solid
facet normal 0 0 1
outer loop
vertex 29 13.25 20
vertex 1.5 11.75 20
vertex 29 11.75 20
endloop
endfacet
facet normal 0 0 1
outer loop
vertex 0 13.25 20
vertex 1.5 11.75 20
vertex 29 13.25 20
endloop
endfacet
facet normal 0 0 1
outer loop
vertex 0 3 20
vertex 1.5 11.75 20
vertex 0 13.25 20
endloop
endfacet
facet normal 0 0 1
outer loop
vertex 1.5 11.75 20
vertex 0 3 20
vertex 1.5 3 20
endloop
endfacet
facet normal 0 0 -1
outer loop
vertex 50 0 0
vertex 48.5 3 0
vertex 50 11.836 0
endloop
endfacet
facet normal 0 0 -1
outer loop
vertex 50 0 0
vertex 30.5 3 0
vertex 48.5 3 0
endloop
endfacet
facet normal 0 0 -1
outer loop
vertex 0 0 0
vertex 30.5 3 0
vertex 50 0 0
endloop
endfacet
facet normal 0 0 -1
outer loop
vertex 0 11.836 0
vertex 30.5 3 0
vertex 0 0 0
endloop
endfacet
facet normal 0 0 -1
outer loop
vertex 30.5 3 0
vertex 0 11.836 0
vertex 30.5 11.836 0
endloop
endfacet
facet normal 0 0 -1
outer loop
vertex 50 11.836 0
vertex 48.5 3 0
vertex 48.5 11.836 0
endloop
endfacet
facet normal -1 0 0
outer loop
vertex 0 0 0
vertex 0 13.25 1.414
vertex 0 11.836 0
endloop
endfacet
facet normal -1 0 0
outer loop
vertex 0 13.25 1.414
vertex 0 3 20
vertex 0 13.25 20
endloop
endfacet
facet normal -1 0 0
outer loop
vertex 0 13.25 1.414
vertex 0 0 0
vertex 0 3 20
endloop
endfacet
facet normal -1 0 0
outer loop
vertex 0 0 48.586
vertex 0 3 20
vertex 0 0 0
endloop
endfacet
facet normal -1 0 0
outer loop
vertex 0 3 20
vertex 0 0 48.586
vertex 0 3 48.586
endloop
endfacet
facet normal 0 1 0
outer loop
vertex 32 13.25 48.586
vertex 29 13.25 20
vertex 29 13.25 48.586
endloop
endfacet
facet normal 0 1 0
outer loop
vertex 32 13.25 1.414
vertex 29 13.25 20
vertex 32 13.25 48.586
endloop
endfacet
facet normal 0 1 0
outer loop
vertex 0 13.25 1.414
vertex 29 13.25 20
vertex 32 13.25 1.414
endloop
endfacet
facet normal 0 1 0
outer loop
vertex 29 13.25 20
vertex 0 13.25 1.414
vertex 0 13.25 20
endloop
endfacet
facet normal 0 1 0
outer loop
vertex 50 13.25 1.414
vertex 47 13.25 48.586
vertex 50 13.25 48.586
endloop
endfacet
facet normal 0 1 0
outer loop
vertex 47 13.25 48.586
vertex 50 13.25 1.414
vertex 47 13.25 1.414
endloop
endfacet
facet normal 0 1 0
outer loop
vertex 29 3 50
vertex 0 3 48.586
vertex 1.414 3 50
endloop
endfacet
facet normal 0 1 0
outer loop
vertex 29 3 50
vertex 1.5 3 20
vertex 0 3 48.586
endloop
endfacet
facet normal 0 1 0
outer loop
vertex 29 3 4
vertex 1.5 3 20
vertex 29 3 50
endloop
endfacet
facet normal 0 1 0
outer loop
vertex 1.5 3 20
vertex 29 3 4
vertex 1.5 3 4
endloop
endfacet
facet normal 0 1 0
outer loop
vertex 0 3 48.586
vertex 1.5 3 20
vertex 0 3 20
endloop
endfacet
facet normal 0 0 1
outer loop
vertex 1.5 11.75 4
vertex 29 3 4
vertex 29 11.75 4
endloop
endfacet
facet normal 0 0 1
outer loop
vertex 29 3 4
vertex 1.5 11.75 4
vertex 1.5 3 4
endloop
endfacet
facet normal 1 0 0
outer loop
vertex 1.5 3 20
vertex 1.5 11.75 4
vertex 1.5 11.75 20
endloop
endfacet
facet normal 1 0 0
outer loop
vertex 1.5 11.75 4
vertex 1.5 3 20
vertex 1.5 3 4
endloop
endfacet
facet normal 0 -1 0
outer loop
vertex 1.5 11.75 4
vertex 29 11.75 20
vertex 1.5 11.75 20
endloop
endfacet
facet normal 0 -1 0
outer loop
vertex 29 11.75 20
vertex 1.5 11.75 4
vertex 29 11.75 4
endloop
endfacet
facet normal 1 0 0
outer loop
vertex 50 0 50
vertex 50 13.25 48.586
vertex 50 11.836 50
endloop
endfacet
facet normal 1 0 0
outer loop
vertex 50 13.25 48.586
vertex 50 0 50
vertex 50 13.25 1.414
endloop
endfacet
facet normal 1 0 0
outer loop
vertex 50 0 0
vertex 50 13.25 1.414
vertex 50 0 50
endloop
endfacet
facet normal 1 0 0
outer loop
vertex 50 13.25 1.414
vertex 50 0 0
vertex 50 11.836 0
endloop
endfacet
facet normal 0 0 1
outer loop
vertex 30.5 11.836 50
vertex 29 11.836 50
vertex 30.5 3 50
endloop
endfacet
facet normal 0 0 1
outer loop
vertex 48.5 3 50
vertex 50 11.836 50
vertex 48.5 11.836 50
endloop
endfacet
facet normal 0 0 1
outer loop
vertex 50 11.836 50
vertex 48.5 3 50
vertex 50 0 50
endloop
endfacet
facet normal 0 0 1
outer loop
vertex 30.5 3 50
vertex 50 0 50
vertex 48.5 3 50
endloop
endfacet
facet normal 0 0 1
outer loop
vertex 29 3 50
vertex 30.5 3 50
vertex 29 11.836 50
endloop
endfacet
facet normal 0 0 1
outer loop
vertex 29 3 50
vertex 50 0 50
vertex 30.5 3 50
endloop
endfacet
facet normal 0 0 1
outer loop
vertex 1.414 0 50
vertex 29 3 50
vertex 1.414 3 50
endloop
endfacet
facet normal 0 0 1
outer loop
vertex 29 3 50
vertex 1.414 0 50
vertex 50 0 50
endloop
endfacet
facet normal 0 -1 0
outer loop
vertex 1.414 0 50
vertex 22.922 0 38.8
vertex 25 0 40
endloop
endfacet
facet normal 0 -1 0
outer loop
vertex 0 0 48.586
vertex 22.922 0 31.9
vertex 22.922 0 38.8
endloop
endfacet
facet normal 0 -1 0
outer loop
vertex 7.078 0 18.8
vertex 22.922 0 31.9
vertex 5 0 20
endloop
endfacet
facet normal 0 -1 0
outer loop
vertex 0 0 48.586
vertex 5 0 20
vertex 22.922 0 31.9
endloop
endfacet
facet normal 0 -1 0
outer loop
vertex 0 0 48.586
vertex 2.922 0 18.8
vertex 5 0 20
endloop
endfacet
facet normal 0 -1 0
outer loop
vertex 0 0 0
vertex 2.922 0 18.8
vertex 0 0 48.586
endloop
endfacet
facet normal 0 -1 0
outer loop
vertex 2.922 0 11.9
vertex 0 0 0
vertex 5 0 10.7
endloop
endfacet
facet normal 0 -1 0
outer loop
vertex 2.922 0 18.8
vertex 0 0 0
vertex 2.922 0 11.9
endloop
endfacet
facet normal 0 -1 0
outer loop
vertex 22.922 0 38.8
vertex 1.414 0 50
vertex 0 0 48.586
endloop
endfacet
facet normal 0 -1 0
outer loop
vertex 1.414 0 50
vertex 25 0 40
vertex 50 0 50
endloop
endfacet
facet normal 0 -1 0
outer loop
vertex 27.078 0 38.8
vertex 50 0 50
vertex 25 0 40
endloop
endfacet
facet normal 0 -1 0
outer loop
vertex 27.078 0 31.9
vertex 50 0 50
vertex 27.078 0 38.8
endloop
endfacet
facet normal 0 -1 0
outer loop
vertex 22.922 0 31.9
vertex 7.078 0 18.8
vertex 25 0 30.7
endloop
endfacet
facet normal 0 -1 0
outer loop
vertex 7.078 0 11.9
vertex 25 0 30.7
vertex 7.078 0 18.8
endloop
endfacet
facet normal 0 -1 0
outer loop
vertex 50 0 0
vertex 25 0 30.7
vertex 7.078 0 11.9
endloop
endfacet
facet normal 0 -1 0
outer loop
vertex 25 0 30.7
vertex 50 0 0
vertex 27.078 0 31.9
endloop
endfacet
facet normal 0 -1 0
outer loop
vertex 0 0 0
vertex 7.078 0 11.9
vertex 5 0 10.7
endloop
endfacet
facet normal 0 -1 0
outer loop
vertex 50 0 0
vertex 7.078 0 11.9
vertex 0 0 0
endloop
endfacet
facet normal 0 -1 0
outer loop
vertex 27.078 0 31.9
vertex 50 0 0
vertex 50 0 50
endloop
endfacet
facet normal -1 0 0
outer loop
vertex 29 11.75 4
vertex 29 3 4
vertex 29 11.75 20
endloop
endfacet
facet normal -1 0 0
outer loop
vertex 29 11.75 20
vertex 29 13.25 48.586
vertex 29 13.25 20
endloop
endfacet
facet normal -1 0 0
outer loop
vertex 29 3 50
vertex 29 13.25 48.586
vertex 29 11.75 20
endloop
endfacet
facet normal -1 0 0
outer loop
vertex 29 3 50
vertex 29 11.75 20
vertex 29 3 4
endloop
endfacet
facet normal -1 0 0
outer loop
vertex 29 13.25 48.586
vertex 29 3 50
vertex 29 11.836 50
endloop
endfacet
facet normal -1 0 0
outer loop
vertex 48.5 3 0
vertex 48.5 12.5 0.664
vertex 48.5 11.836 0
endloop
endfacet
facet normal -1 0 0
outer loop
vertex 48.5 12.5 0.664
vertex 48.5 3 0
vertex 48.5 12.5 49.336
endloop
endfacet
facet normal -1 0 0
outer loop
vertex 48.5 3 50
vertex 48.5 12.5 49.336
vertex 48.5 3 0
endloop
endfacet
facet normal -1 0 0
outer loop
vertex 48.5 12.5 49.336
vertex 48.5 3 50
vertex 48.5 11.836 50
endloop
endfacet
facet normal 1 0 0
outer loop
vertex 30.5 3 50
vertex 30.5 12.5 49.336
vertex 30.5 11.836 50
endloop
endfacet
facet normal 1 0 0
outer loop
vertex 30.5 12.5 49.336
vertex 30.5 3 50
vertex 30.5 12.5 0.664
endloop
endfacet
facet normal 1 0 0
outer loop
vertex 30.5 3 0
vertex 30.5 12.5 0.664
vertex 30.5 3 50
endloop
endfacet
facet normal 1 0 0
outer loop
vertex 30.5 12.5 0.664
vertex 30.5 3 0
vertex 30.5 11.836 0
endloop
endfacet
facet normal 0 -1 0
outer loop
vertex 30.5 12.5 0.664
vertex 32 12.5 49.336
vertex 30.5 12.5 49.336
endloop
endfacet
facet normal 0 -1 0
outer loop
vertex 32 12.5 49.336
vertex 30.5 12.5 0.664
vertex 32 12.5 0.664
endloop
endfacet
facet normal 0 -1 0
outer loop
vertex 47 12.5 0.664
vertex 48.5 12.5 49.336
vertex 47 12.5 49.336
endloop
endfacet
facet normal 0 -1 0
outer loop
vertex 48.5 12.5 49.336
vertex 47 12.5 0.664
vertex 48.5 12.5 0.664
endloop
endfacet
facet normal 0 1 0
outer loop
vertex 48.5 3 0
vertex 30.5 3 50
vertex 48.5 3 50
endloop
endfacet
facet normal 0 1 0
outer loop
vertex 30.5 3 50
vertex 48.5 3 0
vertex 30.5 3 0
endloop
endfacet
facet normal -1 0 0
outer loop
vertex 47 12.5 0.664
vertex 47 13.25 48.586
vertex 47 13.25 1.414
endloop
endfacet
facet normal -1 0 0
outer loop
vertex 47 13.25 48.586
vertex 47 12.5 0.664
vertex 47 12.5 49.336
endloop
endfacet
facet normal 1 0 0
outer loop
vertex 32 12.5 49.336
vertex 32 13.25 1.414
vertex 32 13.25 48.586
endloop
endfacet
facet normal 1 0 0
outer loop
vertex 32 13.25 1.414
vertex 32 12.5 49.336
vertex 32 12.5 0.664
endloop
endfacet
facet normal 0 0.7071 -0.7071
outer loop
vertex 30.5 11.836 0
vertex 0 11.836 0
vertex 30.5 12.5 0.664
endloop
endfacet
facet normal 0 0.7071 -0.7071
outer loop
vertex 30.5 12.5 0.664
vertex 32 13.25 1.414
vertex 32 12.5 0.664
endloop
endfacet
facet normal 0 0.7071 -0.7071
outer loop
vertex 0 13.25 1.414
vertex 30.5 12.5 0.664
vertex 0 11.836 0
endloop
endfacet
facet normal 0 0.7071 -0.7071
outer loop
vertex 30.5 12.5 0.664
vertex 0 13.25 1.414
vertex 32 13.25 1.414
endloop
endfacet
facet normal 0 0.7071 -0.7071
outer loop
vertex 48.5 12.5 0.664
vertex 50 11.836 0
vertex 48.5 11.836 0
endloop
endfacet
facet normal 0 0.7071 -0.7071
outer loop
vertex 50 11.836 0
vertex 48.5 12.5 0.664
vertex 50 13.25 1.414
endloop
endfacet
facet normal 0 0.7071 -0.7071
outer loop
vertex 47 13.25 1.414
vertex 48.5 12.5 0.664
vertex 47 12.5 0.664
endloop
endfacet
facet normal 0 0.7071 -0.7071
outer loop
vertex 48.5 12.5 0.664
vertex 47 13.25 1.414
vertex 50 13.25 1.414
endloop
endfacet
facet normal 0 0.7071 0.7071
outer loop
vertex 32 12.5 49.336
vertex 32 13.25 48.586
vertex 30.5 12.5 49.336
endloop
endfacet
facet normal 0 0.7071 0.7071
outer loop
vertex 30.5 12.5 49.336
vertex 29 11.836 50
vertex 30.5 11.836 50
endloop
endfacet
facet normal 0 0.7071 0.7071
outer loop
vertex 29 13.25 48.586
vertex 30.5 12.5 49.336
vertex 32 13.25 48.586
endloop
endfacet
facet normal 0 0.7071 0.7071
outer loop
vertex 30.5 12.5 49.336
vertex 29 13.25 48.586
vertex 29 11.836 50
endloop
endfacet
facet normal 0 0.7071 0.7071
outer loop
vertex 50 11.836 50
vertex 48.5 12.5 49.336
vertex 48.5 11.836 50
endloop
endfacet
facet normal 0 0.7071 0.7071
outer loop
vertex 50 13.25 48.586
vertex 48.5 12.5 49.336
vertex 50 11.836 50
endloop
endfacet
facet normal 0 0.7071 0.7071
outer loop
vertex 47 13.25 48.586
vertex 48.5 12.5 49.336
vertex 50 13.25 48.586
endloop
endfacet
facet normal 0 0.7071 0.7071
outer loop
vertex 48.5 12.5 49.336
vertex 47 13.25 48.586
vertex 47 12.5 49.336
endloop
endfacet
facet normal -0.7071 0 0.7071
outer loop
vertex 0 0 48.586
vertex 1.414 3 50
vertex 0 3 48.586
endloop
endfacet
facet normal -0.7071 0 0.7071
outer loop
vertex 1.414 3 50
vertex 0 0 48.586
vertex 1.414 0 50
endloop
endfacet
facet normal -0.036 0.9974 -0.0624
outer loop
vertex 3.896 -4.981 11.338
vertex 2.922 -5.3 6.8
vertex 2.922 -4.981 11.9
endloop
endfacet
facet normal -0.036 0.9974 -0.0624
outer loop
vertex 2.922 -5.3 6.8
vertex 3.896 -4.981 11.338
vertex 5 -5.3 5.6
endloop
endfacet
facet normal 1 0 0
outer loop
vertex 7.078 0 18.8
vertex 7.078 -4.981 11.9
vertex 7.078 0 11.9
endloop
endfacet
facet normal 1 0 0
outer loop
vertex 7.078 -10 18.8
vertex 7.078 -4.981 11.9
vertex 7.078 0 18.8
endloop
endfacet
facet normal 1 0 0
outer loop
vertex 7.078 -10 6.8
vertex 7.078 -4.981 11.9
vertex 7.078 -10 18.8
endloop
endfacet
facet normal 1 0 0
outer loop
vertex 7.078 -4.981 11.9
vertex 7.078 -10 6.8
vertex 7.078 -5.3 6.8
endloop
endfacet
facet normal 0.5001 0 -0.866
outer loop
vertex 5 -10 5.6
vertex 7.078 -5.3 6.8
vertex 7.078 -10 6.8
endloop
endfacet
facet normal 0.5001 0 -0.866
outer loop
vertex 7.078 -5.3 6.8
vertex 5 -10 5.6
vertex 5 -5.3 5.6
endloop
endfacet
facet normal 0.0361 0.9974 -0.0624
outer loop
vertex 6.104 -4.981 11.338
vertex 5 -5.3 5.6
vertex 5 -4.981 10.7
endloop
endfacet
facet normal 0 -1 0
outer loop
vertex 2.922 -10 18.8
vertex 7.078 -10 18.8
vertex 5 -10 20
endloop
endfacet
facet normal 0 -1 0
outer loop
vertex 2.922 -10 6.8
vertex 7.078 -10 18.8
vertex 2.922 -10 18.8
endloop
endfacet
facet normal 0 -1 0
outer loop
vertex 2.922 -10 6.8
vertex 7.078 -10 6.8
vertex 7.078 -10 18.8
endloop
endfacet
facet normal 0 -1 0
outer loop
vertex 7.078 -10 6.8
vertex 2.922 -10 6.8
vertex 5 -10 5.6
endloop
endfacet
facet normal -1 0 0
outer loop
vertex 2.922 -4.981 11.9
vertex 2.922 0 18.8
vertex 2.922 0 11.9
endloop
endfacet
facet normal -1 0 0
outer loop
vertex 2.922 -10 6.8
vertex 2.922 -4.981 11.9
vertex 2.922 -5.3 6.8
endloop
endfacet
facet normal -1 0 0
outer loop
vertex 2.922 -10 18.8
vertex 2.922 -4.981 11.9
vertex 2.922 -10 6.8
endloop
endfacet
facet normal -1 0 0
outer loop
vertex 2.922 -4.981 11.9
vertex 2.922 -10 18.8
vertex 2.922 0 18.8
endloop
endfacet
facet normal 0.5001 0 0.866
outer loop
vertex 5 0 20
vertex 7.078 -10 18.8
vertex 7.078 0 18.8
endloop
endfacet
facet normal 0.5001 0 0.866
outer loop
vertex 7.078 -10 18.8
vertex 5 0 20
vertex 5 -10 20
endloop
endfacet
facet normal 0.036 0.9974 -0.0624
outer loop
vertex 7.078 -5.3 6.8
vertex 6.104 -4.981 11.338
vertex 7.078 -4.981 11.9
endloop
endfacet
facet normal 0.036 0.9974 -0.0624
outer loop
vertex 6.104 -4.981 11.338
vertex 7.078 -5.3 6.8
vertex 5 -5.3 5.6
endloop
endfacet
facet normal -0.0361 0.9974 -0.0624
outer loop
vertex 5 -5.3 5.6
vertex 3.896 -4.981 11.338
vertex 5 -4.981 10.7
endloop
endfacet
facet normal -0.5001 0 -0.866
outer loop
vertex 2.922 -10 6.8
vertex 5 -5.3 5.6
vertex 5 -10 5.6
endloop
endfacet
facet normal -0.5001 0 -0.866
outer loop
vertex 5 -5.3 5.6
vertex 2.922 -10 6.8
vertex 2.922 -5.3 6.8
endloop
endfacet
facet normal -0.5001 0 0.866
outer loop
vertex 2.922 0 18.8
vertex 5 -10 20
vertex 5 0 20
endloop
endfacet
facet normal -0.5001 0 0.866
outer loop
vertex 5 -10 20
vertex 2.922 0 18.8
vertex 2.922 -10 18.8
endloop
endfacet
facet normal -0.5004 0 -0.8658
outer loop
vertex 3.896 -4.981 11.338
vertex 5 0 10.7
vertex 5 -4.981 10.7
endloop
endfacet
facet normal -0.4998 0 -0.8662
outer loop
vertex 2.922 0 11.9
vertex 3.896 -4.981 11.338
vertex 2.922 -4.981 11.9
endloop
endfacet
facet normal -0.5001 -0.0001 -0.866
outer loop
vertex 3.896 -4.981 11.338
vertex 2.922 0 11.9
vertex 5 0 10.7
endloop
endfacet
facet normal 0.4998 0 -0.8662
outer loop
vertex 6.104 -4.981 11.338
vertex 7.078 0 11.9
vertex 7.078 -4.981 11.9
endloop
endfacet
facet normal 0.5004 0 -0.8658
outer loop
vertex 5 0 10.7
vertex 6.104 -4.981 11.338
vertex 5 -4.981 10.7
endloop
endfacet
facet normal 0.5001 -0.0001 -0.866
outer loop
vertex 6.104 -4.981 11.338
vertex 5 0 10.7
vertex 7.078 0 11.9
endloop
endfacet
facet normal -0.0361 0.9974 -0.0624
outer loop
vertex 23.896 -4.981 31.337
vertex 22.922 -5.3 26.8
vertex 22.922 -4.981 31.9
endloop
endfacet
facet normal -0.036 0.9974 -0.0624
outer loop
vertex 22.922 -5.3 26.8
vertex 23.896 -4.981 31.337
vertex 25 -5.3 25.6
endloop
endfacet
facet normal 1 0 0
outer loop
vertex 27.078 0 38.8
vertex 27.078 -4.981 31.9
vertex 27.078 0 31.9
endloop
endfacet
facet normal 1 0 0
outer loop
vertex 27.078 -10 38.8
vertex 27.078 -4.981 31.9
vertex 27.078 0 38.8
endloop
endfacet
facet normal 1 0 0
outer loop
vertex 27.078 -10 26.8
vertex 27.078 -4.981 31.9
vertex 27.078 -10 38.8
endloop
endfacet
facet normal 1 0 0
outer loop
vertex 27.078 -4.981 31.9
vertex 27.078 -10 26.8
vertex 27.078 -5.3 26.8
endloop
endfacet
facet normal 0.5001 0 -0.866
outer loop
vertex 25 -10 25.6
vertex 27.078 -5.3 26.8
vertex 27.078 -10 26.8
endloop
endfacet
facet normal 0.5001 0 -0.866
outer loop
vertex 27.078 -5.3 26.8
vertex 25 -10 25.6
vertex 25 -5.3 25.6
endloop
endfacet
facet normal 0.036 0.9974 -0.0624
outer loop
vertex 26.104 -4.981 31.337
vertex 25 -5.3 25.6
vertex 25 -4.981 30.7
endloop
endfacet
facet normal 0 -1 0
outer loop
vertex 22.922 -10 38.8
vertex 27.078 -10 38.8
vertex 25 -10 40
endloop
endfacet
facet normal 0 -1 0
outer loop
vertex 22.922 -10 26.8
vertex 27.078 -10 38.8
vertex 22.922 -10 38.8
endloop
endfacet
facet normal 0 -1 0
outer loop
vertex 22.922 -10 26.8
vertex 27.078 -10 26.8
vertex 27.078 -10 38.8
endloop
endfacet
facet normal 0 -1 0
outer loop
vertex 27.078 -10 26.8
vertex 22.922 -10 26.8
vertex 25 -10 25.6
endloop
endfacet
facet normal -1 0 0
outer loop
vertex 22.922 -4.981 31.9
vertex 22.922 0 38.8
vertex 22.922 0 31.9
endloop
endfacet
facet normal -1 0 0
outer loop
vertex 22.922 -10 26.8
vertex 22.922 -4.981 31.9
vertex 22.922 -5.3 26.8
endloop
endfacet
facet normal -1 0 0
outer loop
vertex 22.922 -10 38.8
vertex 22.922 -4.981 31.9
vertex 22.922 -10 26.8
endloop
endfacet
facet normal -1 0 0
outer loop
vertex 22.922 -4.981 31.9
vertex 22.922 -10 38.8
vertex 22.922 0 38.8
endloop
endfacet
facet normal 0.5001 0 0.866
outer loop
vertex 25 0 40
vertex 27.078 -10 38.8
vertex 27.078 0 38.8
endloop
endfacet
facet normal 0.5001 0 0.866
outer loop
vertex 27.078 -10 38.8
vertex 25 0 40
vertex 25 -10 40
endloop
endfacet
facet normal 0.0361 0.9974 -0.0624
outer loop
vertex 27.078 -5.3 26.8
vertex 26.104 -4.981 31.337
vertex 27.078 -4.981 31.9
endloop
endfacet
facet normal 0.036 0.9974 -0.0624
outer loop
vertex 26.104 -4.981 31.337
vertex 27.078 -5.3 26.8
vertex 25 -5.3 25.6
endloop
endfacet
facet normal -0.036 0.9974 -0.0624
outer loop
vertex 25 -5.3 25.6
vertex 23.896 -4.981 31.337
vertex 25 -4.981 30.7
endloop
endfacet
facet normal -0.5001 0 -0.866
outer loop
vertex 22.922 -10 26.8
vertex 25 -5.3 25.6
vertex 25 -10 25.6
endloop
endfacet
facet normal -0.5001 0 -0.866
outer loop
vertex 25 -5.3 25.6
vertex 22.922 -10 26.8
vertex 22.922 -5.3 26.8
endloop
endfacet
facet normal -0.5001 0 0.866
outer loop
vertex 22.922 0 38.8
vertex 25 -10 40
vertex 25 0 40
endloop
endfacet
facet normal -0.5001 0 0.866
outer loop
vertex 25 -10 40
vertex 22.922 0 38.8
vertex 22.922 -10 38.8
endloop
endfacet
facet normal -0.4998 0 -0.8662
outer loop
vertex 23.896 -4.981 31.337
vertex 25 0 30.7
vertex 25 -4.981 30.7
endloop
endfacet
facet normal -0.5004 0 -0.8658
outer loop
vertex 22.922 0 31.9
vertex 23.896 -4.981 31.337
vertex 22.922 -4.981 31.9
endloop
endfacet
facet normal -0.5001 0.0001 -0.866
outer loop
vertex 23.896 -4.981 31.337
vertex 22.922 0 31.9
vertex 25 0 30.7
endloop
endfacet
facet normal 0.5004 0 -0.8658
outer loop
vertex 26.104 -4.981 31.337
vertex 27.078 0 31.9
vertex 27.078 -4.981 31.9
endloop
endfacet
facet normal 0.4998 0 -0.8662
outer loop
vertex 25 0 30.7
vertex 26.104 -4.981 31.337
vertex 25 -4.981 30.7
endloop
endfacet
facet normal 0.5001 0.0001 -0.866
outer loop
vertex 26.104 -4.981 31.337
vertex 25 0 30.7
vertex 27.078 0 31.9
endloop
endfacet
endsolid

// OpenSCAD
// SKADIS Light switch holder

w = 18;
d = 9.5;


cw = 1.5;
difference() {
  union() {
    cube([50,3,50]);
    translate([50-18-2*cw,3,0]) {
      cube([18+2*cw,d+cw/2,50]);
    }

    // Pocket
    difference() {
      translate([0,3,0]) cube([50-w,d+cw/2,20]);
      translate([1.5,3,4]) cube([50-w,d+cw/2-1.5,20]);
    }
  }
  // Switch
  translate([50-cw-w,3,-10]) cube([w,d,70]);
  translate([50-w,3,-10]) cube([w-2*cw,d*2,70]);
  
  // Chamfers
  translate([25,3+d+cw/2,0]) rotate([45,0,0]) cube([51,2,2], center=true);
  translate([25,3+d+cw/2,50]) rotate([45,0,0]) cube([51,2,2], center=true);
  translate([0,0,50]) rotate([45,0,90]) cube([51,2,2], center=true);
}

translate([5,0,20]) {
  hook();
  translate([20,0,20]) hook();
}


module hooks(x, y, mode="all", min_edge=10) {
  hook_width = 5;
  hook_height = 15;
  cols = floor((x - 2*min_edge - hook_width)/20)+1;
  offsetX = (x - ((cols-1)*20)) / 2;
  echo("cols", cols)
  echo("offsetX", offsetX);

  rows = floor((y - 2*min_edge - hook_height)/40)+1;
  offsetY = (hook_height/2) + (y - ((rows)*40)) / 2;
  echo("rows", rows)
  echo("offsetY", offsetY);

  translate([offsetX, 0, offsetY])
  for (col = [0:1:cols-1]) {
    for (row = [0:1:rows-1]) {
      inbetween_offset = col % 2 ? 0 : 20;
      is_bottom_row = col % 2 == 0 ? row == 0 : row == 1;
      if (mode == "all" ||
         (mode == "edge" && (
            col == 0 || // Left
            row == 0 || // Bottom
            col == cols-1 || // Right
            (col % 2 == 0 ? row == rows-1 : false)))
        ) {
        //color(is_bottom_row ? "red" : "black")
        if (inbetween_offset + row * 40 > 0)
          translate([col * 20, 0, inbetween_offset + row * 40]) hook();
      }
    }
  }
}

module hook() {
  // t is the amount we reduce the width/height by to let it fit ok
  t = 0.1;
  // w = width
  w = 5;
  // wt is the width less the t
  wt = w - t * 2;
  // h is the hight less a bit to make it fit
  h = 15 - 0.3;
  // h2 is the height of the smaller part of the peg
  h2 = h - 5;
  // ht is the height less t
  ht = h - t;
  // d is the depth of the board
  d = 5;
  // 12 gives us enough facets to create a easy to print angle
  $fn = 6;

  translate([0, -d*2, -wt/2]) rotate([270, 90,0]) union() {
    // The larger part of the peg
    hull() {
      cylinder(d=wt, h=d + 0.3);
      // -0.3 is the taper applied to the face that makes contact with the back on the pegboard
      translate([ht-w, 0, 0]) cylinder(d=wt, h=d -0.3);
    }
    // The smaller part of the peg
    translate([0, 0, 0]) hull() {
      cylinder(d=wt, h = d * 2);
      translate([h2 - w - t * 2 ,0 ,0]) cylinder(d=wt, h=d * 2);
      };
  }
}
